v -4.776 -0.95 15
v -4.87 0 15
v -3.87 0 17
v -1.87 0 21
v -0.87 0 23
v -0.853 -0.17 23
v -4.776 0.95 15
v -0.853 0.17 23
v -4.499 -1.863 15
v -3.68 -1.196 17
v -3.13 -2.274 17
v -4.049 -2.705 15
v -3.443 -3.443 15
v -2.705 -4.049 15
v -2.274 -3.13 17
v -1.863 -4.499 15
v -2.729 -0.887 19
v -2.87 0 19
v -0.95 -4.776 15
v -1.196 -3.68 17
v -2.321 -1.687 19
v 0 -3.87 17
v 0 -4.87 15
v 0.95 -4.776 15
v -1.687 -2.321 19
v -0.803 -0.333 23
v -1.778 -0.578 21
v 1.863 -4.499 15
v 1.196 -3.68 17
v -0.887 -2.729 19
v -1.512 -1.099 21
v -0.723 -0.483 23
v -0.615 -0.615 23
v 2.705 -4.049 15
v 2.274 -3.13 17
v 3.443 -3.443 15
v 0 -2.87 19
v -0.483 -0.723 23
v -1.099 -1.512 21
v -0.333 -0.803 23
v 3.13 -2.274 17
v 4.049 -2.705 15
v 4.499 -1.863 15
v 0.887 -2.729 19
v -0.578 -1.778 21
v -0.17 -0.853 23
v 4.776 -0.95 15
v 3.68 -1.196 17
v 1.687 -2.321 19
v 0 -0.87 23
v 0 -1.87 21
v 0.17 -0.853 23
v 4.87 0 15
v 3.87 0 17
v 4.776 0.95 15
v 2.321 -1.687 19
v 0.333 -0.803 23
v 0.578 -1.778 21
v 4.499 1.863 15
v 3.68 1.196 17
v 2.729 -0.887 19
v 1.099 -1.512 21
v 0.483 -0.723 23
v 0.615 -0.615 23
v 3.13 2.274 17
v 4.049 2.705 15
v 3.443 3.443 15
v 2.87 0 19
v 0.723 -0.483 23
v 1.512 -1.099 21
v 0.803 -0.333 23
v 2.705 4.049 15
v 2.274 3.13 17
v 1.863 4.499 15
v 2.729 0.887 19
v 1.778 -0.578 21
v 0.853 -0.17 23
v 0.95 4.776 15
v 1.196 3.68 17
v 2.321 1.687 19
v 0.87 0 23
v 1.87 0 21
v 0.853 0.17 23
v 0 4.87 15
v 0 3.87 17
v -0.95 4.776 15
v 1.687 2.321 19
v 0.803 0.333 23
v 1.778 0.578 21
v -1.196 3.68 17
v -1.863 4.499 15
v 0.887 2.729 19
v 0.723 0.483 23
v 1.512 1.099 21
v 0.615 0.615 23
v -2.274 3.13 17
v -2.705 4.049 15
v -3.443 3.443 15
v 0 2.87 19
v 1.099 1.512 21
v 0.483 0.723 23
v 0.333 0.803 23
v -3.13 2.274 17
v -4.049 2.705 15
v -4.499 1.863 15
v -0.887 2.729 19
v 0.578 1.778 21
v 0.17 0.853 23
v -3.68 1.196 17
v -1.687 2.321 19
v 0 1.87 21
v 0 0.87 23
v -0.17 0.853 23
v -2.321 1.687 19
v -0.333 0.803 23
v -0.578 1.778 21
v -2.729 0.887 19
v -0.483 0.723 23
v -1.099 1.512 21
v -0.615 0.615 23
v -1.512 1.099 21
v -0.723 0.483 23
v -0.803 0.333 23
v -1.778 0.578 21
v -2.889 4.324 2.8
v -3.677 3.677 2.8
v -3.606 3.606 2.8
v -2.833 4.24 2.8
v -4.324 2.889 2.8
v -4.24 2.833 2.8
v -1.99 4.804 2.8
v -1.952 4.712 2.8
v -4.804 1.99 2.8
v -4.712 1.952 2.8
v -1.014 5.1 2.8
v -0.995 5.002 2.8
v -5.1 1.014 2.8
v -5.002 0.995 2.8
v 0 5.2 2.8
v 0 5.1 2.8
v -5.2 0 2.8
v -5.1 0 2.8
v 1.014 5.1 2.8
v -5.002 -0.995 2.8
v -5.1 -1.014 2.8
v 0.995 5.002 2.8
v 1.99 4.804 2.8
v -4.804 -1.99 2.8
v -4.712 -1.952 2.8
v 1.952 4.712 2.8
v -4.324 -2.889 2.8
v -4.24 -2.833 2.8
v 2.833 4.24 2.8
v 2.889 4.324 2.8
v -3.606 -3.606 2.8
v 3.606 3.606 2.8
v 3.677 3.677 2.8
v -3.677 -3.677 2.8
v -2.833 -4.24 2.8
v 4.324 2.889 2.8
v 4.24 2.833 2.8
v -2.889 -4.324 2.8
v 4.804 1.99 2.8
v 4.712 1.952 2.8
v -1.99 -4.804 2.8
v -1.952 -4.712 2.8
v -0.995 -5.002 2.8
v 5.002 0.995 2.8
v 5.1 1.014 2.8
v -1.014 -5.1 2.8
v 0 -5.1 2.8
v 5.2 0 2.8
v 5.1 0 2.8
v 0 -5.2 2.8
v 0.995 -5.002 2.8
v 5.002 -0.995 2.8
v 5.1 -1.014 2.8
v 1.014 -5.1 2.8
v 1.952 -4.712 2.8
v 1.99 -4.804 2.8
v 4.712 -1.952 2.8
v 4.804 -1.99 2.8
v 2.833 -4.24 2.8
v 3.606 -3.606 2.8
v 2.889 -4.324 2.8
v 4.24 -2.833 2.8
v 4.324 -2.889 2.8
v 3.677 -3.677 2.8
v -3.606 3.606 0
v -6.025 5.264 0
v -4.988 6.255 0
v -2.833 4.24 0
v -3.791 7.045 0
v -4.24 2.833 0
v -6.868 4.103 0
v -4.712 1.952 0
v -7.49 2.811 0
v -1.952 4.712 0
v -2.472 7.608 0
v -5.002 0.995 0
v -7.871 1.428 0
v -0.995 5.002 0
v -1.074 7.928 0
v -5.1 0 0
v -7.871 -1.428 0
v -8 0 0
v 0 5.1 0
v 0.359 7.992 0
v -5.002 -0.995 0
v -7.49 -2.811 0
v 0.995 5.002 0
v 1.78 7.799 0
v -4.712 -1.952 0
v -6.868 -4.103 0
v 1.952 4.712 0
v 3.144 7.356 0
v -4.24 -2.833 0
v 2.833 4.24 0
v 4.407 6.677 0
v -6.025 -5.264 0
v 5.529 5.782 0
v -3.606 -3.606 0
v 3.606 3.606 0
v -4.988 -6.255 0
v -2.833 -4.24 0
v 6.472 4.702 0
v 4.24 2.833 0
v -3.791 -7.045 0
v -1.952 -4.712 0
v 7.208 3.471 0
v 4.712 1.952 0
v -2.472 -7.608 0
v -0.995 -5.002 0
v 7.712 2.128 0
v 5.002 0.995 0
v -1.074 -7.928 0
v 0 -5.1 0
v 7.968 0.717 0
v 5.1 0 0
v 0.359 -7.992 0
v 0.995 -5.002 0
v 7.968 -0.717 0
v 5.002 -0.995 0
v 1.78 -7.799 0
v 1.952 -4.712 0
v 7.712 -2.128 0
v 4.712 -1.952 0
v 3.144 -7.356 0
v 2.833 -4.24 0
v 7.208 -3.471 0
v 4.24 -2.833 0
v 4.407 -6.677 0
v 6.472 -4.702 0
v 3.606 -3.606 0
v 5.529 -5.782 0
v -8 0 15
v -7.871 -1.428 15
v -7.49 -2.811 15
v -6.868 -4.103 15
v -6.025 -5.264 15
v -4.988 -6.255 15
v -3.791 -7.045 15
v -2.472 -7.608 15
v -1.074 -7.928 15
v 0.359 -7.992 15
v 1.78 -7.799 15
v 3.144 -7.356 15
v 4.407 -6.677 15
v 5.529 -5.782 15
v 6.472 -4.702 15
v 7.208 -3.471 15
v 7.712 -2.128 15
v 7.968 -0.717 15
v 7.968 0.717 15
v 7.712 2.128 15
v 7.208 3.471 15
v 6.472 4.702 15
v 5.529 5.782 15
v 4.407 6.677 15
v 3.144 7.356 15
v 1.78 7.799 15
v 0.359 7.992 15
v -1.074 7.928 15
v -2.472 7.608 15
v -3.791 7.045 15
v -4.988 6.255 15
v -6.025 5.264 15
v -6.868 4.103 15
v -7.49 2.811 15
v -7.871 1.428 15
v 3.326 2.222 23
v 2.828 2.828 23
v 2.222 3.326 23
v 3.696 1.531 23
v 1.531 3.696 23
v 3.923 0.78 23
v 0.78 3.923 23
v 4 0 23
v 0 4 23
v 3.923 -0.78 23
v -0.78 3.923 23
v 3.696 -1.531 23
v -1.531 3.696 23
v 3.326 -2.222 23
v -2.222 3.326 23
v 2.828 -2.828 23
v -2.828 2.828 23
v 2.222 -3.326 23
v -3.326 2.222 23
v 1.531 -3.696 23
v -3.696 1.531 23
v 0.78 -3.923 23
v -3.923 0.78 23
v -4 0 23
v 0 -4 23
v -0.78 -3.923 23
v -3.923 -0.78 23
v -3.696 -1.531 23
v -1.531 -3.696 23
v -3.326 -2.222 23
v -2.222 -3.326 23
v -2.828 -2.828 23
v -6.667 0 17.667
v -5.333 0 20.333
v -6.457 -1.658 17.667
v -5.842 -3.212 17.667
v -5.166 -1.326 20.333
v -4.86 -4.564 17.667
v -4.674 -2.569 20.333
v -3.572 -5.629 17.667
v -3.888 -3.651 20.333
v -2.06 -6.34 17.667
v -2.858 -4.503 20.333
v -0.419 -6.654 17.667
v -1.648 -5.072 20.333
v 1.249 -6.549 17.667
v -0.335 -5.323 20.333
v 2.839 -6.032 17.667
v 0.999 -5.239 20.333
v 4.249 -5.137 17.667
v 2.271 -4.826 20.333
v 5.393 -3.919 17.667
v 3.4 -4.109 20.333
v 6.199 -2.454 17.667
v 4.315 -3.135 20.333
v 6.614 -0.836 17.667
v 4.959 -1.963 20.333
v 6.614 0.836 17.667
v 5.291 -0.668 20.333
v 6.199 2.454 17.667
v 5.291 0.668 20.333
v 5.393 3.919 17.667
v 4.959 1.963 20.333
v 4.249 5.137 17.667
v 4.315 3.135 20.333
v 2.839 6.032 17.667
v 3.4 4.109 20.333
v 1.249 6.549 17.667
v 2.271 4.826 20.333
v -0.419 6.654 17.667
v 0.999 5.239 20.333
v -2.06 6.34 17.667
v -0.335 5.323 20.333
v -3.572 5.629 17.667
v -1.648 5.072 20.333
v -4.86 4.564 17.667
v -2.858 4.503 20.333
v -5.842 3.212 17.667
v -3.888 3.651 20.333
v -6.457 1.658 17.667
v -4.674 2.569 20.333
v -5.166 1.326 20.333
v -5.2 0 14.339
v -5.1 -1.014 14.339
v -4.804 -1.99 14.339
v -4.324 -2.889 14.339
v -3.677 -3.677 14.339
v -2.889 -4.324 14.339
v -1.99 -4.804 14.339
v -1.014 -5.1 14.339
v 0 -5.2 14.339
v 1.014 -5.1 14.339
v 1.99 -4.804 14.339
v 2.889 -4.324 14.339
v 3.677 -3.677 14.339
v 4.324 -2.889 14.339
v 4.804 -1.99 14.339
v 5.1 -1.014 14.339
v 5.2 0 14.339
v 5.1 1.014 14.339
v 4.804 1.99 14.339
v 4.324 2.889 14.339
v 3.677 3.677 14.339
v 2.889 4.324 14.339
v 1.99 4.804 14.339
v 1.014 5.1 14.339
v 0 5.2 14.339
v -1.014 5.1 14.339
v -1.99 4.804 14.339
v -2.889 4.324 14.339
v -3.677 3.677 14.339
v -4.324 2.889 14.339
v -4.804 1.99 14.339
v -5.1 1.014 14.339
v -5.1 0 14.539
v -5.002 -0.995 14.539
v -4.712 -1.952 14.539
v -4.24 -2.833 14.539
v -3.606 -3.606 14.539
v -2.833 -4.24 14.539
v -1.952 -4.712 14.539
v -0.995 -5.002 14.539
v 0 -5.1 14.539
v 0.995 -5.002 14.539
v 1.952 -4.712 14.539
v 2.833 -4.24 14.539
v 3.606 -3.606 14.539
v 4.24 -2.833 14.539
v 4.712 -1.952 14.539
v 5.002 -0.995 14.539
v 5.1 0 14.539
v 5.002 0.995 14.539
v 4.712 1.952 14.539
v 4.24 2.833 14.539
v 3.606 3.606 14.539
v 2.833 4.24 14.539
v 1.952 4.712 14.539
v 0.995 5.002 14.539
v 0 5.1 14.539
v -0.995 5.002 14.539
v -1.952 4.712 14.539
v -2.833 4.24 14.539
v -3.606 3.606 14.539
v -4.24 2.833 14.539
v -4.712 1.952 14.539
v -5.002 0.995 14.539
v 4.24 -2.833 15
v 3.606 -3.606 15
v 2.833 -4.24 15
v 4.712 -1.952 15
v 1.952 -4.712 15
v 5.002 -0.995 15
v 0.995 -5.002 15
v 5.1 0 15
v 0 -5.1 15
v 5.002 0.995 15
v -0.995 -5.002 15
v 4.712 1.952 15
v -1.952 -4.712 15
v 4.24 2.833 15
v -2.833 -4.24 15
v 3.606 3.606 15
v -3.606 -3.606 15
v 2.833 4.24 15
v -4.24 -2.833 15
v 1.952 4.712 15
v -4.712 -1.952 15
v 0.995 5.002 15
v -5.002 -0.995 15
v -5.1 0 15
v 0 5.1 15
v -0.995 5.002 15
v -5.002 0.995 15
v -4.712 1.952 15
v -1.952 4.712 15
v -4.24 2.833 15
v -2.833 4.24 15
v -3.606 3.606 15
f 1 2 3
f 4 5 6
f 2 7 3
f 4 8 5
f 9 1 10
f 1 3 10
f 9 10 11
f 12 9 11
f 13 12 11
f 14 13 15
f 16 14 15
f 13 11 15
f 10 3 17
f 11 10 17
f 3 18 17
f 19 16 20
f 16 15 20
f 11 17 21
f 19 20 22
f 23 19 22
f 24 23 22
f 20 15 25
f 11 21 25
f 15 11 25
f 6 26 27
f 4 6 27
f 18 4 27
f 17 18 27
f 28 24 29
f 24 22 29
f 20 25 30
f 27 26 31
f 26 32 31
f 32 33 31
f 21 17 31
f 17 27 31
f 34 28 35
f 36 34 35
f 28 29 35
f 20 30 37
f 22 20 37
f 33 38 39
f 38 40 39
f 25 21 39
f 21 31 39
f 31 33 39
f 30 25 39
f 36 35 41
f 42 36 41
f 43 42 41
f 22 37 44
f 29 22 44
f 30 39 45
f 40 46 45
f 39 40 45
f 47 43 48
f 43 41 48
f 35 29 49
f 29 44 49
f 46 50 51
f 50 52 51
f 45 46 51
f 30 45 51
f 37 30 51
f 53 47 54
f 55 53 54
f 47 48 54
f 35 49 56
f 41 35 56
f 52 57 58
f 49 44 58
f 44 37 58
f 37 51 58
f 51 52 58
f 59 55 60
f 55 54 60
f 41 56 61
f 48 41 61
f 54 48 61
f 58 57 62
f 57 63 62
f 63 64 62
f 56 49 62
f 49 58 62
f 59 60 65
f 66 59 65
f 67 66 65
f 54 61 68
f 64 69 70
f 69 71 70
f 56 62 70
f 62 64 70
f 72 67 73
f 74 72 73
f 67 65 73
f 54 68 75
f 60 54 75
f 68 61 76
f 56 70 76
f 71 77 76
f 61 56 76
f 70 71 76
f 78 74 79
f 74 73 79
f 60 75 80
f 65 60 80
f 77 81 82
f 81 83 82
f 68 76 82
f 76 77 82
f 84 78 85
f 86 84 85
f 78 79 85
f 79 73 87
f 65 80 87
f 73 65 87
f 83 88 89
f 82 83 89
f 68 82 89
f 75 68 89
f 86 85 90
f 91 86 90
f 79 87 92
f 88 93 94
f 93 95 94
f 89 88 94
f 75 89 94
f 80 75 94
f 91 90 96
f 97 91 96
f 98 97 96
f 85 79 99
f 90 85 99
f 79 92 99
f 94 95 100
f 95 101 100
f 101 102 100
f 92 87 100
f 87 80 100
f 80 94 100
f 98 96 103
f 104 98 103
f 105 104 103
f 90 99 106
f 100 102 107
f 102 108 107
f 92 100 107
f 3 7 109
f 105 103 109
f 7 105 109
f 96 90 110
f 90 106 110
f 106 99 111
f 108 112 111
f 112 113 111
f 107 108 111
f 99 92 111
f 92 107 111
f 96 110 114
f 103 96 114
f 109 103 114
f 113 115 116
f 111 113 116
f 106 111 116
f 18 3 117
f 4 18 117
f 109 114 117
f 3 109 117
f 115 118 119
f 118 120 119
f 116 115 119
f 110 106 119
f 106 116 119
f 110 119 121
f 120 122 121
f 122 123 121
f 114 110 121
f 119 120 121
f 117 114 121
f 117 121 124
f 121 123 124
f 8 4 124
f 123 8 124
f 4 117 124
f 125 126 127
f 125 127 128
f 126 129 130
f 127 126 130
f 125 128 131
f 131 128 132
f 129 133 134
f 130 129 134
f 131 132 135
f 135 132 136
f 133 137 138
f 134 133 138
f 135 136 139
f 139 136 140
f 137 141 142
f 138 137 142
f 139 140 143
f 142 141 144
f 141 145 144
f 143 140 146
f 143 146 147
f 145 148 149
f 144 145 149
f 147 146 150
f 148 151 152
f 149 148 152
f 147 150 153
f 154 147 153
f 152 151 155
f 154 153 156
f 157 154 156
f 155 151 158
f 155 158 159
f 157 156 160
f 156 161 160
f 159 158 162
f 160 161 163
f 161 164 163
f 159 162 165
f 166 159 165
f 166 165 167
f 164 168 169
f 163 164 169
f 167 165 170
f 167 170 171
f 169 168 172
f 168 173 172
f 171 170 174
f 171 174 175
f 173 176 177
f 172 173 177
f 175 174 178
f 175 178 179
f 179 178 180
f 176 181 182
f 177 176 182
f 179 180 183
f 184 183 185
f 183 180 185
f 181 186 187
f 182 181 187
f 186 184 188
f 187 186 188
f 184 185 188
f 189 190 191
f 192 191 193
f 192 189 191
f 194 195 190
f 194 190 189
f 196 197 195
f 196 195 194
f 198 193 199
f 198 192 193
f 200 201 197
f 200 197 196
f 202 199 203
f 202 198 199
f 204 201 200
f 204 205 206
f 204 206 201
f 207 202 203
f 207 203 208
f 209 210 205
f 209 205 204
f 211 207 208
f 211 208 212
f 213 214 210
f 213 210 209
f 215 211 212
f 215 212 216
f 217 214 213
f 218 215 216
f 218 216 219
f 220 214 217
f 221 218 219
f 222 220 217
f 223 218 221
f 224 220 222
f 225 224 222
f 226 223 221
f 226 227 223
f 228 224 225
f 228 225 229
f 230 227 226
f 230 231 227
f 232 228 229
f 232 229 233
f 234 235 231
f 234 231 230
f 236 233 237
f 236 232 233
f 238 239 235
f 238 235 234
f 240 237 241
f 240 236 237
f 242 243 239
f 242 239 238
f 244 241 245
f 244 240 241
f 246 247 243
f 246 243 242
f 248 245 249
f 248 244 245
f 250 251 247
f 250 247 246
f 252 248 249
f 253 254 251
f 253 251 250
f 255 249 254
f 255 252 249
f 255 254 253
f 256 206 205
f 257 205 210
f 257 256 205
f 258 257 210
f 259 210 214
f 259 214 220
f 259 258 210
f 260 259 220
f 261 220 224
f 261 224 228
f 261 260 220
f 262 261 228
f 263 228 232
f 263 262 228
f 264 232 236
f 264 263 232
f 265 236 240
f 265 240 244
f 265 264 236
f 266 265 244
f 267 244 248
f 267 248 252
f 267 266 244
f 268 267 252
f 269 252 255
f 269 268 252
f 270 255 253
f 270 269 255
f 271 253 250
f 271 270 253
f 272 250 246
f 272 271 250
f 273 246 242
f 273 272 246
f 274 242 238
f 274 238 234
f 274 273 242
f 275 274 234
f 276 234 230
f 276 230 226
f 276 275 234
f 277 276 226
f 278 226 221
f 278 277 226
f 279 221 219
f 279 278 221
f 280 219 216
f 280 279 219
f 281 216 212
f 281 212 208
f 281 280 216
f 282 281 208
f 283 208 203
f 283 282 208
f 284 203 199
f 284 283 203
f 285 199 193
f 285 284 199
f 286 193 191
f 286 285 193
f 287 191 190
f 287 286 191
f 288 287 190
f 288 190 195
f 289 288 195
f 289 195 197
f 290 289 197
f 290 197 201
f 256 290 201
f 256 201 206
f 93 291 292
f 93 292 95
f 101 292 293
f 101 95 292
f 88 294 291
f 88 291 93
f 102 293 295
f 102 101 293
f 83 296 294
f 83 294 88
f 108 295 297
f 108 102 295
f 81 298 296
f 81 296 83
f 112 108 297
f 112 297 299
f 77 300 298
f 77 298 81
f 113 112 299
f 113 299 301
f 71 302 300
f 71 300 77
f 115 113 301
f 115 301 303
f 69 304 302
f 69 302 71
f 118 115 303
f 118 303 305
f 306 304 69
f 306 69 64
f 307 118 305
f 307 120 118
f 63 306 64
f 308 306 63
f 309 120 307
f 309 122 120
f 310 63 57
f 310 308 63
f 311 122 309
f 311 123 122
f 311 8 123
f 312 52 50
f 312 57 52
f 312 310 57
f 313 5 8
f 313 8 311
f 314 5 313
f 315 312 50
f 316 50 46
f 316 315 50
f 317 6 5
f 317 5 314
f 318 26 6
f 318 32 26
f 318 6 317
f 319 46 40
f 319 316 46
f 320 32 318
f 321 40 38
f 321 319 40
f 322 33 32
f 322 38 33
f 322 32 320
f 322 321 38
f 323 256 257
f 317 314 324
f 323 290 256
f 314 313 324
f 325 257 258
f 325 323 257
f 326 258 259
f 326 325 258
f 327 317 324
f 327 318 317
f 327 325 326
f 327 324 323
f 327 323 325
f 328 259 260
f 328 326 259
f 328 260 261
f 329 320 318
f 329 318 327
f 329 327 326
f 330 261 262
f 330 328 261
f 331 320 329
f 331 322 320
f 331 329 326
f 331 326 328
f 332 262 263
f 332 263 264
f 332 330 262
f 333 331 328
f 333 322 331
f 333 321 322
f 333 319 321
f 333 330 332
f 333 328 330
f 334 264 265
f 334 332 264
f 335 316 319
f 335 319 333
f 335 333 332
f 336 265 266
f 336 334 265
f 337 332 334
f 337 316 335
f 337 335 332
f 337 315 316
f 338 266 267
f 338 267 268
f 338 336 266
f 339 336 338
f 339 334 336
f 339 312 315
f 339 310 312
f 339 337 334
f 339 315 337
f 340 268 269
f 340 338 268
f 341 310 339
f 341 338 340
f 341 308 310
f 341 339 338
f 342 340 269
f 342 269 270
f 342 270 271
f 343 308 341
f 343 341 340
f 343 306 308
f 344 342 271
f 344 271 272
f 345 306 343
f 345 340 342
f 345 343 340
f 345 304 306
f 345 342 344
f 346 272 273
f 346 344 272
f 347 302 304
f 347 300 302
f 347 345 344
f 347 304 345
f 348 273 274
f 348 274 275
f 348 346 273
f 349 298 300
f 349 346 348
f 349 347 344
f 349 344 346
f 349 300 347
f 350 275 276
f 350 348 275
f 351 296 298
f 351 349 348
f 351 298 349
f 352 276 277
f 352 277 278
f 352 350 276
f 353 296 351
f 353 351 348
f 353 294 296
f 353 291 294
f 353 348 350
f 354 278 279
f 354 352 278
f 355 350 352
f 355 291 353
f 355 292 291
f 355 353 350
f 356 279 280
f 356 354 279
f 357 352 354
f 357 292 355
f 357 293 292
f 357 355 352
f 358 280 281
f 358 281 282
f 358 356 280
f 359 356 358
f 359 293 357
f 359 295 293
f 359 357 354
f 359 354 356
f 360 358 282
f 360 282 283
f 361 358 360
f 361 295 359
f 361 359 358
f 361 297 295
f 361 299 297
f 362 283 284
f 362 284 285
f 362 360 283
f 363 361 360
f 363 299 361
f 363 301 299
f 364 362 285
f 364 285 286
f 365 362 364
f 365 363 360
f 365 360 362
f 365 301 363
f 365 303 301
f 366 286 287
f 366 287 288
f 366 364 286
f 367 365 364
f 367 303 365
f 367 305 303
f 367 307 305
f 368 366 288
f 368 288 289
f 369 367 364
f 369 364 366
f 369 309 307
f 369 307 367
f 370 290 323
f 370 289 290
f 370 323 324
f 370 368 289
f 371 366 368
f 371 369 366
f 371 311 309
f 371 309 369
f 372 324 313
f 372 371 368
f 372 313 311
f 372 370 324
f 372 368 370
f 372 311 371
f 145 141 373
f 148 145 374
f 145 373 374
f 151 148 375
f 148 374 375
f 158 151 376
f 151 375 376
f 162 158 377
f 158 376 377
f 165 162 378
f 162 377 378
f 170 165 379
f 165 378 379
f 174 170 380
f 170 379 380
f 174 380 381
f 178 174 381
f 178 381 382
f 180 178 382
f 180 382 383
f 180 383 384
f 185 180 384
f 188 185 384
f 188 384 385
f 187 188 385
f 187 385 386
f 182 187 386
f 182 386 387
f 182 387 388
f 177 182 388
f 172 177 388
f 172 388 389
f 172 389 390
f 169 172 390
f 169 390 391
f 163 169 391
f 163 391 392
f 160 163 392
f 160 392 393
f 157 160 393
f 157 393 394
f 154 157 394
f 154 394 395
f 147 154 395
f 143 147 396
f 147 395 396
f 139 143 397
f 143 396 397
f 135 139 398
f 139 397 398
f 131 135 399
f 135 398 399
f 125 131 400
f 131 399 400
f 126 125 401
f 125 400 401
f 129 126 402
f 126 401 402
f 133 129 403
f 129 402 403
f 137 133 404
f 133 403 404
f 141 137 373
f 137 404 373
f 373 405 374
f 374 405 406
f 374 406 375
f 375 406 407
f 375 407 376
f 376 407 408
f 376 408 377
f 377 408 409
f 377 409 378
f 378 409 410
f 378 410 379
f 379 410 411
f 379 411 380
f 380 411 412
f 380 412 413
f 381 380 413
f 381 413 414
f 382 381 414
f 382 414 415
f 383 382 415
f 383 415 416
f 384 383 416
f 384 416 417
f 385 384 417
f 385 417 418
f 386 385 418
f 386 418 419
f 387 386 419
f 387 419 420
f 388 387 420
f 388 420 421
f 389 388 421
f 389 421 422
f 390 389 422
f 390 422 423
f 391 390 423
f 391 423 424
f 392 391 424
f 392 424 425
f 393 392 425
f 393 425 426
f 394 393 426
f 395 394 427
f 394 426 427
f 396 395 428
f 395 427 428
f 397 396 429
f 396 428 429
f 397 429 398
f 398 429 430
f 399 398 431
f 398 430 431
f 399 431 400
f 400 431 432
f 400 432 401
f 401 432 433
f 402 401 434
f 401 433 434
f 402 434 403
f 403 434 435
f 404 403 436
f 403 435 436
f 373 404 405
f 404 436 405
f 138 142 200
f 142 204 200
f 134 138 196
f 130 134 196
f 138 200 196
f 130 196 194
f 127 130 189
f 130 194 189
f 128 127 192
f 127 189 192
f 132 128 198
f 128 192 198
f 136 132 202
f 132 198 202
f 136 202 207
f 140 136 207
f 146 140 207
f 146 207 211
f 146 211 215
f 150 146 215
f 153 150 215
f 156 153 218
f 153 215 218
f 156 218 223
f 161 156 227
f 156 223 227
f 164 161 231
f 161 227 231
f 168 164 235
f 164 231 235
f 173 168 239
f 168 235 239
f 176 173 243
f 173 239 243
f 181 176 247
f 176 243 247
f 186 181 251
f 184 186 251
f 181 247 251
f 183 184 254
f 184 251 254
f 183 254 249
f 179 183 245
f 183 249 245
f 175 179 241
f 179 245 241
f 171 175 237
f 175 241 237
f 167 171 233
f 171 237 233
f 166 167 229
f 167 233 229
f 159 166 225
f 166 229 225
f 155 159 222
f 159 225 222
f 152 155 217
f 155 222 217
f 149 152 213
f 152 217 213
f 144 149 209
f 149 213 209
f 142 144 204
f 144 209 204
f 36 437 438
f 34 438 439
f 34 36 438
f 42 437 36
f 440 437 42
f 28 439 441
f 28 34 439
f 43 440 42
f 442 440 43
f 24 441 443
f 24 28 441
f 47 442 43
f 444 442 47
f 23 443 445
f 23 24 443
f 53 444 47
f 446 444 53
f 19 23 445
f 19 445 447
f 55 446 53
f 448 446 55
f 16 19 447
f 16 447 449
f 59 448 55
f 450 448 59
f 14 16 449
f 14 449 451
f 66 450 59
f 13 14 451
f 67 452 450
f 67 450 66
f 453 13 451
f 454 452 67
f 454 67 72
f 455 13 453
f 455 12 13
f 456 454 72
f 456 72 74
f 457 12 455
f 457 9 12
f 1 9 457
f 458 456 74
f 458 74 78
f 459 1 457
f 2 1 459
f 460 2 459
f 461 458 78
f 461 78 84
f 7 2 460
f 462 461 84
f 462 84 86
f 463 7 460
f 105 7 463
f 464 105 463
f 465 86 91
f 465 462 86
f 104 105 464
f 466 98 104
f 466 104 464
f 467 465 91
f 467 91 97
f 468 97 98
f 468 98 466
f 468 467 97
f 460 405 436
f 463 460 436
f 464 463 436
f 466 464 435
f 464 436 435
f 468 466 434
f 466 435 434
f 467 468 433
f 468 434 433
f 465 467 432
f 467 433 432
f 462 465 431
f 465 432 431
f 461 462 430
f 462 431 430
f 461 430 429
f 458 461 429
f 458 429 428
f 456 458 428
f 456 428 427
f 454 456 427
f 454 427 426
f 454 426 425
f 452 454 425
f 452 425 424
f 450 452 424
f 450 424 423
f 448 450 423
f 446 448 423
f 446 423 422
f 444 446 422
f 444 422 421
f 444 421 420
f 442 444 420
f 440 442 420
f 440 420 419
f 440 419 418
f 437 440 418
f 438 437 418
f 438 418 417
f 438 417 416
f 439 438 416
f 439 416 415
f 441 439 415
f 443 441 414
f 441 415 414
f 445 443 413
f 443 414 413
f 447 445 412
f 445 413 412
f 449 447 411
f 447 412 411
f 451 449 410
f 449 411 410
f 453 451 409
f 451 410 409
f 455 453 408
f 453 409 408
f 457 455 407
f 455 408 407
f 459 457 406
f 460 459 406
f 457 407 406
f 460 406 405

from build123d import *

# Parameters (mm, degrees)
SHELL1_T           = -2.8
SKETCH6_R          = 5.1
CUT_EXTRUDE4_DEPTH = 15


with BuildPart() as part:
    # Sketch1 → Revolve1 (revolve)
    with BuildSketch(Plane(origin=(0, 0, 0), x_dir=(1, 0, 0), z_dir=(0, 1, 0))):
        Polygon((0, 0), (-8, 0), (-8, -15), (-4, -23), (0, -23), align=None)
    revolve(axis=Axis((0, 0, -36.045977011), (0, 0, 1)))

    # Shell1
    shell1_openings = [part.faces().sort_by_distance(p)[0] for p in [
        (0, 0, 23),
    ]]
    offset(amount=SHELL1_T, openings=shell1_openings, kind=Kind.INTERSECTION)

    # Sketch6 → Cut-Extrude4 (cut)
    with BuildSketch(Plane(origin=(0, 0, 0), x_dir=(-1, 0, 0), z_dir=(0, 0, -1))):
        Circle(SKETCH6_R)
    extrude(amount=-CUT_EXTRUDE4_DEPTH, mode=Mode.SUBTRACT)


solid = part.part
